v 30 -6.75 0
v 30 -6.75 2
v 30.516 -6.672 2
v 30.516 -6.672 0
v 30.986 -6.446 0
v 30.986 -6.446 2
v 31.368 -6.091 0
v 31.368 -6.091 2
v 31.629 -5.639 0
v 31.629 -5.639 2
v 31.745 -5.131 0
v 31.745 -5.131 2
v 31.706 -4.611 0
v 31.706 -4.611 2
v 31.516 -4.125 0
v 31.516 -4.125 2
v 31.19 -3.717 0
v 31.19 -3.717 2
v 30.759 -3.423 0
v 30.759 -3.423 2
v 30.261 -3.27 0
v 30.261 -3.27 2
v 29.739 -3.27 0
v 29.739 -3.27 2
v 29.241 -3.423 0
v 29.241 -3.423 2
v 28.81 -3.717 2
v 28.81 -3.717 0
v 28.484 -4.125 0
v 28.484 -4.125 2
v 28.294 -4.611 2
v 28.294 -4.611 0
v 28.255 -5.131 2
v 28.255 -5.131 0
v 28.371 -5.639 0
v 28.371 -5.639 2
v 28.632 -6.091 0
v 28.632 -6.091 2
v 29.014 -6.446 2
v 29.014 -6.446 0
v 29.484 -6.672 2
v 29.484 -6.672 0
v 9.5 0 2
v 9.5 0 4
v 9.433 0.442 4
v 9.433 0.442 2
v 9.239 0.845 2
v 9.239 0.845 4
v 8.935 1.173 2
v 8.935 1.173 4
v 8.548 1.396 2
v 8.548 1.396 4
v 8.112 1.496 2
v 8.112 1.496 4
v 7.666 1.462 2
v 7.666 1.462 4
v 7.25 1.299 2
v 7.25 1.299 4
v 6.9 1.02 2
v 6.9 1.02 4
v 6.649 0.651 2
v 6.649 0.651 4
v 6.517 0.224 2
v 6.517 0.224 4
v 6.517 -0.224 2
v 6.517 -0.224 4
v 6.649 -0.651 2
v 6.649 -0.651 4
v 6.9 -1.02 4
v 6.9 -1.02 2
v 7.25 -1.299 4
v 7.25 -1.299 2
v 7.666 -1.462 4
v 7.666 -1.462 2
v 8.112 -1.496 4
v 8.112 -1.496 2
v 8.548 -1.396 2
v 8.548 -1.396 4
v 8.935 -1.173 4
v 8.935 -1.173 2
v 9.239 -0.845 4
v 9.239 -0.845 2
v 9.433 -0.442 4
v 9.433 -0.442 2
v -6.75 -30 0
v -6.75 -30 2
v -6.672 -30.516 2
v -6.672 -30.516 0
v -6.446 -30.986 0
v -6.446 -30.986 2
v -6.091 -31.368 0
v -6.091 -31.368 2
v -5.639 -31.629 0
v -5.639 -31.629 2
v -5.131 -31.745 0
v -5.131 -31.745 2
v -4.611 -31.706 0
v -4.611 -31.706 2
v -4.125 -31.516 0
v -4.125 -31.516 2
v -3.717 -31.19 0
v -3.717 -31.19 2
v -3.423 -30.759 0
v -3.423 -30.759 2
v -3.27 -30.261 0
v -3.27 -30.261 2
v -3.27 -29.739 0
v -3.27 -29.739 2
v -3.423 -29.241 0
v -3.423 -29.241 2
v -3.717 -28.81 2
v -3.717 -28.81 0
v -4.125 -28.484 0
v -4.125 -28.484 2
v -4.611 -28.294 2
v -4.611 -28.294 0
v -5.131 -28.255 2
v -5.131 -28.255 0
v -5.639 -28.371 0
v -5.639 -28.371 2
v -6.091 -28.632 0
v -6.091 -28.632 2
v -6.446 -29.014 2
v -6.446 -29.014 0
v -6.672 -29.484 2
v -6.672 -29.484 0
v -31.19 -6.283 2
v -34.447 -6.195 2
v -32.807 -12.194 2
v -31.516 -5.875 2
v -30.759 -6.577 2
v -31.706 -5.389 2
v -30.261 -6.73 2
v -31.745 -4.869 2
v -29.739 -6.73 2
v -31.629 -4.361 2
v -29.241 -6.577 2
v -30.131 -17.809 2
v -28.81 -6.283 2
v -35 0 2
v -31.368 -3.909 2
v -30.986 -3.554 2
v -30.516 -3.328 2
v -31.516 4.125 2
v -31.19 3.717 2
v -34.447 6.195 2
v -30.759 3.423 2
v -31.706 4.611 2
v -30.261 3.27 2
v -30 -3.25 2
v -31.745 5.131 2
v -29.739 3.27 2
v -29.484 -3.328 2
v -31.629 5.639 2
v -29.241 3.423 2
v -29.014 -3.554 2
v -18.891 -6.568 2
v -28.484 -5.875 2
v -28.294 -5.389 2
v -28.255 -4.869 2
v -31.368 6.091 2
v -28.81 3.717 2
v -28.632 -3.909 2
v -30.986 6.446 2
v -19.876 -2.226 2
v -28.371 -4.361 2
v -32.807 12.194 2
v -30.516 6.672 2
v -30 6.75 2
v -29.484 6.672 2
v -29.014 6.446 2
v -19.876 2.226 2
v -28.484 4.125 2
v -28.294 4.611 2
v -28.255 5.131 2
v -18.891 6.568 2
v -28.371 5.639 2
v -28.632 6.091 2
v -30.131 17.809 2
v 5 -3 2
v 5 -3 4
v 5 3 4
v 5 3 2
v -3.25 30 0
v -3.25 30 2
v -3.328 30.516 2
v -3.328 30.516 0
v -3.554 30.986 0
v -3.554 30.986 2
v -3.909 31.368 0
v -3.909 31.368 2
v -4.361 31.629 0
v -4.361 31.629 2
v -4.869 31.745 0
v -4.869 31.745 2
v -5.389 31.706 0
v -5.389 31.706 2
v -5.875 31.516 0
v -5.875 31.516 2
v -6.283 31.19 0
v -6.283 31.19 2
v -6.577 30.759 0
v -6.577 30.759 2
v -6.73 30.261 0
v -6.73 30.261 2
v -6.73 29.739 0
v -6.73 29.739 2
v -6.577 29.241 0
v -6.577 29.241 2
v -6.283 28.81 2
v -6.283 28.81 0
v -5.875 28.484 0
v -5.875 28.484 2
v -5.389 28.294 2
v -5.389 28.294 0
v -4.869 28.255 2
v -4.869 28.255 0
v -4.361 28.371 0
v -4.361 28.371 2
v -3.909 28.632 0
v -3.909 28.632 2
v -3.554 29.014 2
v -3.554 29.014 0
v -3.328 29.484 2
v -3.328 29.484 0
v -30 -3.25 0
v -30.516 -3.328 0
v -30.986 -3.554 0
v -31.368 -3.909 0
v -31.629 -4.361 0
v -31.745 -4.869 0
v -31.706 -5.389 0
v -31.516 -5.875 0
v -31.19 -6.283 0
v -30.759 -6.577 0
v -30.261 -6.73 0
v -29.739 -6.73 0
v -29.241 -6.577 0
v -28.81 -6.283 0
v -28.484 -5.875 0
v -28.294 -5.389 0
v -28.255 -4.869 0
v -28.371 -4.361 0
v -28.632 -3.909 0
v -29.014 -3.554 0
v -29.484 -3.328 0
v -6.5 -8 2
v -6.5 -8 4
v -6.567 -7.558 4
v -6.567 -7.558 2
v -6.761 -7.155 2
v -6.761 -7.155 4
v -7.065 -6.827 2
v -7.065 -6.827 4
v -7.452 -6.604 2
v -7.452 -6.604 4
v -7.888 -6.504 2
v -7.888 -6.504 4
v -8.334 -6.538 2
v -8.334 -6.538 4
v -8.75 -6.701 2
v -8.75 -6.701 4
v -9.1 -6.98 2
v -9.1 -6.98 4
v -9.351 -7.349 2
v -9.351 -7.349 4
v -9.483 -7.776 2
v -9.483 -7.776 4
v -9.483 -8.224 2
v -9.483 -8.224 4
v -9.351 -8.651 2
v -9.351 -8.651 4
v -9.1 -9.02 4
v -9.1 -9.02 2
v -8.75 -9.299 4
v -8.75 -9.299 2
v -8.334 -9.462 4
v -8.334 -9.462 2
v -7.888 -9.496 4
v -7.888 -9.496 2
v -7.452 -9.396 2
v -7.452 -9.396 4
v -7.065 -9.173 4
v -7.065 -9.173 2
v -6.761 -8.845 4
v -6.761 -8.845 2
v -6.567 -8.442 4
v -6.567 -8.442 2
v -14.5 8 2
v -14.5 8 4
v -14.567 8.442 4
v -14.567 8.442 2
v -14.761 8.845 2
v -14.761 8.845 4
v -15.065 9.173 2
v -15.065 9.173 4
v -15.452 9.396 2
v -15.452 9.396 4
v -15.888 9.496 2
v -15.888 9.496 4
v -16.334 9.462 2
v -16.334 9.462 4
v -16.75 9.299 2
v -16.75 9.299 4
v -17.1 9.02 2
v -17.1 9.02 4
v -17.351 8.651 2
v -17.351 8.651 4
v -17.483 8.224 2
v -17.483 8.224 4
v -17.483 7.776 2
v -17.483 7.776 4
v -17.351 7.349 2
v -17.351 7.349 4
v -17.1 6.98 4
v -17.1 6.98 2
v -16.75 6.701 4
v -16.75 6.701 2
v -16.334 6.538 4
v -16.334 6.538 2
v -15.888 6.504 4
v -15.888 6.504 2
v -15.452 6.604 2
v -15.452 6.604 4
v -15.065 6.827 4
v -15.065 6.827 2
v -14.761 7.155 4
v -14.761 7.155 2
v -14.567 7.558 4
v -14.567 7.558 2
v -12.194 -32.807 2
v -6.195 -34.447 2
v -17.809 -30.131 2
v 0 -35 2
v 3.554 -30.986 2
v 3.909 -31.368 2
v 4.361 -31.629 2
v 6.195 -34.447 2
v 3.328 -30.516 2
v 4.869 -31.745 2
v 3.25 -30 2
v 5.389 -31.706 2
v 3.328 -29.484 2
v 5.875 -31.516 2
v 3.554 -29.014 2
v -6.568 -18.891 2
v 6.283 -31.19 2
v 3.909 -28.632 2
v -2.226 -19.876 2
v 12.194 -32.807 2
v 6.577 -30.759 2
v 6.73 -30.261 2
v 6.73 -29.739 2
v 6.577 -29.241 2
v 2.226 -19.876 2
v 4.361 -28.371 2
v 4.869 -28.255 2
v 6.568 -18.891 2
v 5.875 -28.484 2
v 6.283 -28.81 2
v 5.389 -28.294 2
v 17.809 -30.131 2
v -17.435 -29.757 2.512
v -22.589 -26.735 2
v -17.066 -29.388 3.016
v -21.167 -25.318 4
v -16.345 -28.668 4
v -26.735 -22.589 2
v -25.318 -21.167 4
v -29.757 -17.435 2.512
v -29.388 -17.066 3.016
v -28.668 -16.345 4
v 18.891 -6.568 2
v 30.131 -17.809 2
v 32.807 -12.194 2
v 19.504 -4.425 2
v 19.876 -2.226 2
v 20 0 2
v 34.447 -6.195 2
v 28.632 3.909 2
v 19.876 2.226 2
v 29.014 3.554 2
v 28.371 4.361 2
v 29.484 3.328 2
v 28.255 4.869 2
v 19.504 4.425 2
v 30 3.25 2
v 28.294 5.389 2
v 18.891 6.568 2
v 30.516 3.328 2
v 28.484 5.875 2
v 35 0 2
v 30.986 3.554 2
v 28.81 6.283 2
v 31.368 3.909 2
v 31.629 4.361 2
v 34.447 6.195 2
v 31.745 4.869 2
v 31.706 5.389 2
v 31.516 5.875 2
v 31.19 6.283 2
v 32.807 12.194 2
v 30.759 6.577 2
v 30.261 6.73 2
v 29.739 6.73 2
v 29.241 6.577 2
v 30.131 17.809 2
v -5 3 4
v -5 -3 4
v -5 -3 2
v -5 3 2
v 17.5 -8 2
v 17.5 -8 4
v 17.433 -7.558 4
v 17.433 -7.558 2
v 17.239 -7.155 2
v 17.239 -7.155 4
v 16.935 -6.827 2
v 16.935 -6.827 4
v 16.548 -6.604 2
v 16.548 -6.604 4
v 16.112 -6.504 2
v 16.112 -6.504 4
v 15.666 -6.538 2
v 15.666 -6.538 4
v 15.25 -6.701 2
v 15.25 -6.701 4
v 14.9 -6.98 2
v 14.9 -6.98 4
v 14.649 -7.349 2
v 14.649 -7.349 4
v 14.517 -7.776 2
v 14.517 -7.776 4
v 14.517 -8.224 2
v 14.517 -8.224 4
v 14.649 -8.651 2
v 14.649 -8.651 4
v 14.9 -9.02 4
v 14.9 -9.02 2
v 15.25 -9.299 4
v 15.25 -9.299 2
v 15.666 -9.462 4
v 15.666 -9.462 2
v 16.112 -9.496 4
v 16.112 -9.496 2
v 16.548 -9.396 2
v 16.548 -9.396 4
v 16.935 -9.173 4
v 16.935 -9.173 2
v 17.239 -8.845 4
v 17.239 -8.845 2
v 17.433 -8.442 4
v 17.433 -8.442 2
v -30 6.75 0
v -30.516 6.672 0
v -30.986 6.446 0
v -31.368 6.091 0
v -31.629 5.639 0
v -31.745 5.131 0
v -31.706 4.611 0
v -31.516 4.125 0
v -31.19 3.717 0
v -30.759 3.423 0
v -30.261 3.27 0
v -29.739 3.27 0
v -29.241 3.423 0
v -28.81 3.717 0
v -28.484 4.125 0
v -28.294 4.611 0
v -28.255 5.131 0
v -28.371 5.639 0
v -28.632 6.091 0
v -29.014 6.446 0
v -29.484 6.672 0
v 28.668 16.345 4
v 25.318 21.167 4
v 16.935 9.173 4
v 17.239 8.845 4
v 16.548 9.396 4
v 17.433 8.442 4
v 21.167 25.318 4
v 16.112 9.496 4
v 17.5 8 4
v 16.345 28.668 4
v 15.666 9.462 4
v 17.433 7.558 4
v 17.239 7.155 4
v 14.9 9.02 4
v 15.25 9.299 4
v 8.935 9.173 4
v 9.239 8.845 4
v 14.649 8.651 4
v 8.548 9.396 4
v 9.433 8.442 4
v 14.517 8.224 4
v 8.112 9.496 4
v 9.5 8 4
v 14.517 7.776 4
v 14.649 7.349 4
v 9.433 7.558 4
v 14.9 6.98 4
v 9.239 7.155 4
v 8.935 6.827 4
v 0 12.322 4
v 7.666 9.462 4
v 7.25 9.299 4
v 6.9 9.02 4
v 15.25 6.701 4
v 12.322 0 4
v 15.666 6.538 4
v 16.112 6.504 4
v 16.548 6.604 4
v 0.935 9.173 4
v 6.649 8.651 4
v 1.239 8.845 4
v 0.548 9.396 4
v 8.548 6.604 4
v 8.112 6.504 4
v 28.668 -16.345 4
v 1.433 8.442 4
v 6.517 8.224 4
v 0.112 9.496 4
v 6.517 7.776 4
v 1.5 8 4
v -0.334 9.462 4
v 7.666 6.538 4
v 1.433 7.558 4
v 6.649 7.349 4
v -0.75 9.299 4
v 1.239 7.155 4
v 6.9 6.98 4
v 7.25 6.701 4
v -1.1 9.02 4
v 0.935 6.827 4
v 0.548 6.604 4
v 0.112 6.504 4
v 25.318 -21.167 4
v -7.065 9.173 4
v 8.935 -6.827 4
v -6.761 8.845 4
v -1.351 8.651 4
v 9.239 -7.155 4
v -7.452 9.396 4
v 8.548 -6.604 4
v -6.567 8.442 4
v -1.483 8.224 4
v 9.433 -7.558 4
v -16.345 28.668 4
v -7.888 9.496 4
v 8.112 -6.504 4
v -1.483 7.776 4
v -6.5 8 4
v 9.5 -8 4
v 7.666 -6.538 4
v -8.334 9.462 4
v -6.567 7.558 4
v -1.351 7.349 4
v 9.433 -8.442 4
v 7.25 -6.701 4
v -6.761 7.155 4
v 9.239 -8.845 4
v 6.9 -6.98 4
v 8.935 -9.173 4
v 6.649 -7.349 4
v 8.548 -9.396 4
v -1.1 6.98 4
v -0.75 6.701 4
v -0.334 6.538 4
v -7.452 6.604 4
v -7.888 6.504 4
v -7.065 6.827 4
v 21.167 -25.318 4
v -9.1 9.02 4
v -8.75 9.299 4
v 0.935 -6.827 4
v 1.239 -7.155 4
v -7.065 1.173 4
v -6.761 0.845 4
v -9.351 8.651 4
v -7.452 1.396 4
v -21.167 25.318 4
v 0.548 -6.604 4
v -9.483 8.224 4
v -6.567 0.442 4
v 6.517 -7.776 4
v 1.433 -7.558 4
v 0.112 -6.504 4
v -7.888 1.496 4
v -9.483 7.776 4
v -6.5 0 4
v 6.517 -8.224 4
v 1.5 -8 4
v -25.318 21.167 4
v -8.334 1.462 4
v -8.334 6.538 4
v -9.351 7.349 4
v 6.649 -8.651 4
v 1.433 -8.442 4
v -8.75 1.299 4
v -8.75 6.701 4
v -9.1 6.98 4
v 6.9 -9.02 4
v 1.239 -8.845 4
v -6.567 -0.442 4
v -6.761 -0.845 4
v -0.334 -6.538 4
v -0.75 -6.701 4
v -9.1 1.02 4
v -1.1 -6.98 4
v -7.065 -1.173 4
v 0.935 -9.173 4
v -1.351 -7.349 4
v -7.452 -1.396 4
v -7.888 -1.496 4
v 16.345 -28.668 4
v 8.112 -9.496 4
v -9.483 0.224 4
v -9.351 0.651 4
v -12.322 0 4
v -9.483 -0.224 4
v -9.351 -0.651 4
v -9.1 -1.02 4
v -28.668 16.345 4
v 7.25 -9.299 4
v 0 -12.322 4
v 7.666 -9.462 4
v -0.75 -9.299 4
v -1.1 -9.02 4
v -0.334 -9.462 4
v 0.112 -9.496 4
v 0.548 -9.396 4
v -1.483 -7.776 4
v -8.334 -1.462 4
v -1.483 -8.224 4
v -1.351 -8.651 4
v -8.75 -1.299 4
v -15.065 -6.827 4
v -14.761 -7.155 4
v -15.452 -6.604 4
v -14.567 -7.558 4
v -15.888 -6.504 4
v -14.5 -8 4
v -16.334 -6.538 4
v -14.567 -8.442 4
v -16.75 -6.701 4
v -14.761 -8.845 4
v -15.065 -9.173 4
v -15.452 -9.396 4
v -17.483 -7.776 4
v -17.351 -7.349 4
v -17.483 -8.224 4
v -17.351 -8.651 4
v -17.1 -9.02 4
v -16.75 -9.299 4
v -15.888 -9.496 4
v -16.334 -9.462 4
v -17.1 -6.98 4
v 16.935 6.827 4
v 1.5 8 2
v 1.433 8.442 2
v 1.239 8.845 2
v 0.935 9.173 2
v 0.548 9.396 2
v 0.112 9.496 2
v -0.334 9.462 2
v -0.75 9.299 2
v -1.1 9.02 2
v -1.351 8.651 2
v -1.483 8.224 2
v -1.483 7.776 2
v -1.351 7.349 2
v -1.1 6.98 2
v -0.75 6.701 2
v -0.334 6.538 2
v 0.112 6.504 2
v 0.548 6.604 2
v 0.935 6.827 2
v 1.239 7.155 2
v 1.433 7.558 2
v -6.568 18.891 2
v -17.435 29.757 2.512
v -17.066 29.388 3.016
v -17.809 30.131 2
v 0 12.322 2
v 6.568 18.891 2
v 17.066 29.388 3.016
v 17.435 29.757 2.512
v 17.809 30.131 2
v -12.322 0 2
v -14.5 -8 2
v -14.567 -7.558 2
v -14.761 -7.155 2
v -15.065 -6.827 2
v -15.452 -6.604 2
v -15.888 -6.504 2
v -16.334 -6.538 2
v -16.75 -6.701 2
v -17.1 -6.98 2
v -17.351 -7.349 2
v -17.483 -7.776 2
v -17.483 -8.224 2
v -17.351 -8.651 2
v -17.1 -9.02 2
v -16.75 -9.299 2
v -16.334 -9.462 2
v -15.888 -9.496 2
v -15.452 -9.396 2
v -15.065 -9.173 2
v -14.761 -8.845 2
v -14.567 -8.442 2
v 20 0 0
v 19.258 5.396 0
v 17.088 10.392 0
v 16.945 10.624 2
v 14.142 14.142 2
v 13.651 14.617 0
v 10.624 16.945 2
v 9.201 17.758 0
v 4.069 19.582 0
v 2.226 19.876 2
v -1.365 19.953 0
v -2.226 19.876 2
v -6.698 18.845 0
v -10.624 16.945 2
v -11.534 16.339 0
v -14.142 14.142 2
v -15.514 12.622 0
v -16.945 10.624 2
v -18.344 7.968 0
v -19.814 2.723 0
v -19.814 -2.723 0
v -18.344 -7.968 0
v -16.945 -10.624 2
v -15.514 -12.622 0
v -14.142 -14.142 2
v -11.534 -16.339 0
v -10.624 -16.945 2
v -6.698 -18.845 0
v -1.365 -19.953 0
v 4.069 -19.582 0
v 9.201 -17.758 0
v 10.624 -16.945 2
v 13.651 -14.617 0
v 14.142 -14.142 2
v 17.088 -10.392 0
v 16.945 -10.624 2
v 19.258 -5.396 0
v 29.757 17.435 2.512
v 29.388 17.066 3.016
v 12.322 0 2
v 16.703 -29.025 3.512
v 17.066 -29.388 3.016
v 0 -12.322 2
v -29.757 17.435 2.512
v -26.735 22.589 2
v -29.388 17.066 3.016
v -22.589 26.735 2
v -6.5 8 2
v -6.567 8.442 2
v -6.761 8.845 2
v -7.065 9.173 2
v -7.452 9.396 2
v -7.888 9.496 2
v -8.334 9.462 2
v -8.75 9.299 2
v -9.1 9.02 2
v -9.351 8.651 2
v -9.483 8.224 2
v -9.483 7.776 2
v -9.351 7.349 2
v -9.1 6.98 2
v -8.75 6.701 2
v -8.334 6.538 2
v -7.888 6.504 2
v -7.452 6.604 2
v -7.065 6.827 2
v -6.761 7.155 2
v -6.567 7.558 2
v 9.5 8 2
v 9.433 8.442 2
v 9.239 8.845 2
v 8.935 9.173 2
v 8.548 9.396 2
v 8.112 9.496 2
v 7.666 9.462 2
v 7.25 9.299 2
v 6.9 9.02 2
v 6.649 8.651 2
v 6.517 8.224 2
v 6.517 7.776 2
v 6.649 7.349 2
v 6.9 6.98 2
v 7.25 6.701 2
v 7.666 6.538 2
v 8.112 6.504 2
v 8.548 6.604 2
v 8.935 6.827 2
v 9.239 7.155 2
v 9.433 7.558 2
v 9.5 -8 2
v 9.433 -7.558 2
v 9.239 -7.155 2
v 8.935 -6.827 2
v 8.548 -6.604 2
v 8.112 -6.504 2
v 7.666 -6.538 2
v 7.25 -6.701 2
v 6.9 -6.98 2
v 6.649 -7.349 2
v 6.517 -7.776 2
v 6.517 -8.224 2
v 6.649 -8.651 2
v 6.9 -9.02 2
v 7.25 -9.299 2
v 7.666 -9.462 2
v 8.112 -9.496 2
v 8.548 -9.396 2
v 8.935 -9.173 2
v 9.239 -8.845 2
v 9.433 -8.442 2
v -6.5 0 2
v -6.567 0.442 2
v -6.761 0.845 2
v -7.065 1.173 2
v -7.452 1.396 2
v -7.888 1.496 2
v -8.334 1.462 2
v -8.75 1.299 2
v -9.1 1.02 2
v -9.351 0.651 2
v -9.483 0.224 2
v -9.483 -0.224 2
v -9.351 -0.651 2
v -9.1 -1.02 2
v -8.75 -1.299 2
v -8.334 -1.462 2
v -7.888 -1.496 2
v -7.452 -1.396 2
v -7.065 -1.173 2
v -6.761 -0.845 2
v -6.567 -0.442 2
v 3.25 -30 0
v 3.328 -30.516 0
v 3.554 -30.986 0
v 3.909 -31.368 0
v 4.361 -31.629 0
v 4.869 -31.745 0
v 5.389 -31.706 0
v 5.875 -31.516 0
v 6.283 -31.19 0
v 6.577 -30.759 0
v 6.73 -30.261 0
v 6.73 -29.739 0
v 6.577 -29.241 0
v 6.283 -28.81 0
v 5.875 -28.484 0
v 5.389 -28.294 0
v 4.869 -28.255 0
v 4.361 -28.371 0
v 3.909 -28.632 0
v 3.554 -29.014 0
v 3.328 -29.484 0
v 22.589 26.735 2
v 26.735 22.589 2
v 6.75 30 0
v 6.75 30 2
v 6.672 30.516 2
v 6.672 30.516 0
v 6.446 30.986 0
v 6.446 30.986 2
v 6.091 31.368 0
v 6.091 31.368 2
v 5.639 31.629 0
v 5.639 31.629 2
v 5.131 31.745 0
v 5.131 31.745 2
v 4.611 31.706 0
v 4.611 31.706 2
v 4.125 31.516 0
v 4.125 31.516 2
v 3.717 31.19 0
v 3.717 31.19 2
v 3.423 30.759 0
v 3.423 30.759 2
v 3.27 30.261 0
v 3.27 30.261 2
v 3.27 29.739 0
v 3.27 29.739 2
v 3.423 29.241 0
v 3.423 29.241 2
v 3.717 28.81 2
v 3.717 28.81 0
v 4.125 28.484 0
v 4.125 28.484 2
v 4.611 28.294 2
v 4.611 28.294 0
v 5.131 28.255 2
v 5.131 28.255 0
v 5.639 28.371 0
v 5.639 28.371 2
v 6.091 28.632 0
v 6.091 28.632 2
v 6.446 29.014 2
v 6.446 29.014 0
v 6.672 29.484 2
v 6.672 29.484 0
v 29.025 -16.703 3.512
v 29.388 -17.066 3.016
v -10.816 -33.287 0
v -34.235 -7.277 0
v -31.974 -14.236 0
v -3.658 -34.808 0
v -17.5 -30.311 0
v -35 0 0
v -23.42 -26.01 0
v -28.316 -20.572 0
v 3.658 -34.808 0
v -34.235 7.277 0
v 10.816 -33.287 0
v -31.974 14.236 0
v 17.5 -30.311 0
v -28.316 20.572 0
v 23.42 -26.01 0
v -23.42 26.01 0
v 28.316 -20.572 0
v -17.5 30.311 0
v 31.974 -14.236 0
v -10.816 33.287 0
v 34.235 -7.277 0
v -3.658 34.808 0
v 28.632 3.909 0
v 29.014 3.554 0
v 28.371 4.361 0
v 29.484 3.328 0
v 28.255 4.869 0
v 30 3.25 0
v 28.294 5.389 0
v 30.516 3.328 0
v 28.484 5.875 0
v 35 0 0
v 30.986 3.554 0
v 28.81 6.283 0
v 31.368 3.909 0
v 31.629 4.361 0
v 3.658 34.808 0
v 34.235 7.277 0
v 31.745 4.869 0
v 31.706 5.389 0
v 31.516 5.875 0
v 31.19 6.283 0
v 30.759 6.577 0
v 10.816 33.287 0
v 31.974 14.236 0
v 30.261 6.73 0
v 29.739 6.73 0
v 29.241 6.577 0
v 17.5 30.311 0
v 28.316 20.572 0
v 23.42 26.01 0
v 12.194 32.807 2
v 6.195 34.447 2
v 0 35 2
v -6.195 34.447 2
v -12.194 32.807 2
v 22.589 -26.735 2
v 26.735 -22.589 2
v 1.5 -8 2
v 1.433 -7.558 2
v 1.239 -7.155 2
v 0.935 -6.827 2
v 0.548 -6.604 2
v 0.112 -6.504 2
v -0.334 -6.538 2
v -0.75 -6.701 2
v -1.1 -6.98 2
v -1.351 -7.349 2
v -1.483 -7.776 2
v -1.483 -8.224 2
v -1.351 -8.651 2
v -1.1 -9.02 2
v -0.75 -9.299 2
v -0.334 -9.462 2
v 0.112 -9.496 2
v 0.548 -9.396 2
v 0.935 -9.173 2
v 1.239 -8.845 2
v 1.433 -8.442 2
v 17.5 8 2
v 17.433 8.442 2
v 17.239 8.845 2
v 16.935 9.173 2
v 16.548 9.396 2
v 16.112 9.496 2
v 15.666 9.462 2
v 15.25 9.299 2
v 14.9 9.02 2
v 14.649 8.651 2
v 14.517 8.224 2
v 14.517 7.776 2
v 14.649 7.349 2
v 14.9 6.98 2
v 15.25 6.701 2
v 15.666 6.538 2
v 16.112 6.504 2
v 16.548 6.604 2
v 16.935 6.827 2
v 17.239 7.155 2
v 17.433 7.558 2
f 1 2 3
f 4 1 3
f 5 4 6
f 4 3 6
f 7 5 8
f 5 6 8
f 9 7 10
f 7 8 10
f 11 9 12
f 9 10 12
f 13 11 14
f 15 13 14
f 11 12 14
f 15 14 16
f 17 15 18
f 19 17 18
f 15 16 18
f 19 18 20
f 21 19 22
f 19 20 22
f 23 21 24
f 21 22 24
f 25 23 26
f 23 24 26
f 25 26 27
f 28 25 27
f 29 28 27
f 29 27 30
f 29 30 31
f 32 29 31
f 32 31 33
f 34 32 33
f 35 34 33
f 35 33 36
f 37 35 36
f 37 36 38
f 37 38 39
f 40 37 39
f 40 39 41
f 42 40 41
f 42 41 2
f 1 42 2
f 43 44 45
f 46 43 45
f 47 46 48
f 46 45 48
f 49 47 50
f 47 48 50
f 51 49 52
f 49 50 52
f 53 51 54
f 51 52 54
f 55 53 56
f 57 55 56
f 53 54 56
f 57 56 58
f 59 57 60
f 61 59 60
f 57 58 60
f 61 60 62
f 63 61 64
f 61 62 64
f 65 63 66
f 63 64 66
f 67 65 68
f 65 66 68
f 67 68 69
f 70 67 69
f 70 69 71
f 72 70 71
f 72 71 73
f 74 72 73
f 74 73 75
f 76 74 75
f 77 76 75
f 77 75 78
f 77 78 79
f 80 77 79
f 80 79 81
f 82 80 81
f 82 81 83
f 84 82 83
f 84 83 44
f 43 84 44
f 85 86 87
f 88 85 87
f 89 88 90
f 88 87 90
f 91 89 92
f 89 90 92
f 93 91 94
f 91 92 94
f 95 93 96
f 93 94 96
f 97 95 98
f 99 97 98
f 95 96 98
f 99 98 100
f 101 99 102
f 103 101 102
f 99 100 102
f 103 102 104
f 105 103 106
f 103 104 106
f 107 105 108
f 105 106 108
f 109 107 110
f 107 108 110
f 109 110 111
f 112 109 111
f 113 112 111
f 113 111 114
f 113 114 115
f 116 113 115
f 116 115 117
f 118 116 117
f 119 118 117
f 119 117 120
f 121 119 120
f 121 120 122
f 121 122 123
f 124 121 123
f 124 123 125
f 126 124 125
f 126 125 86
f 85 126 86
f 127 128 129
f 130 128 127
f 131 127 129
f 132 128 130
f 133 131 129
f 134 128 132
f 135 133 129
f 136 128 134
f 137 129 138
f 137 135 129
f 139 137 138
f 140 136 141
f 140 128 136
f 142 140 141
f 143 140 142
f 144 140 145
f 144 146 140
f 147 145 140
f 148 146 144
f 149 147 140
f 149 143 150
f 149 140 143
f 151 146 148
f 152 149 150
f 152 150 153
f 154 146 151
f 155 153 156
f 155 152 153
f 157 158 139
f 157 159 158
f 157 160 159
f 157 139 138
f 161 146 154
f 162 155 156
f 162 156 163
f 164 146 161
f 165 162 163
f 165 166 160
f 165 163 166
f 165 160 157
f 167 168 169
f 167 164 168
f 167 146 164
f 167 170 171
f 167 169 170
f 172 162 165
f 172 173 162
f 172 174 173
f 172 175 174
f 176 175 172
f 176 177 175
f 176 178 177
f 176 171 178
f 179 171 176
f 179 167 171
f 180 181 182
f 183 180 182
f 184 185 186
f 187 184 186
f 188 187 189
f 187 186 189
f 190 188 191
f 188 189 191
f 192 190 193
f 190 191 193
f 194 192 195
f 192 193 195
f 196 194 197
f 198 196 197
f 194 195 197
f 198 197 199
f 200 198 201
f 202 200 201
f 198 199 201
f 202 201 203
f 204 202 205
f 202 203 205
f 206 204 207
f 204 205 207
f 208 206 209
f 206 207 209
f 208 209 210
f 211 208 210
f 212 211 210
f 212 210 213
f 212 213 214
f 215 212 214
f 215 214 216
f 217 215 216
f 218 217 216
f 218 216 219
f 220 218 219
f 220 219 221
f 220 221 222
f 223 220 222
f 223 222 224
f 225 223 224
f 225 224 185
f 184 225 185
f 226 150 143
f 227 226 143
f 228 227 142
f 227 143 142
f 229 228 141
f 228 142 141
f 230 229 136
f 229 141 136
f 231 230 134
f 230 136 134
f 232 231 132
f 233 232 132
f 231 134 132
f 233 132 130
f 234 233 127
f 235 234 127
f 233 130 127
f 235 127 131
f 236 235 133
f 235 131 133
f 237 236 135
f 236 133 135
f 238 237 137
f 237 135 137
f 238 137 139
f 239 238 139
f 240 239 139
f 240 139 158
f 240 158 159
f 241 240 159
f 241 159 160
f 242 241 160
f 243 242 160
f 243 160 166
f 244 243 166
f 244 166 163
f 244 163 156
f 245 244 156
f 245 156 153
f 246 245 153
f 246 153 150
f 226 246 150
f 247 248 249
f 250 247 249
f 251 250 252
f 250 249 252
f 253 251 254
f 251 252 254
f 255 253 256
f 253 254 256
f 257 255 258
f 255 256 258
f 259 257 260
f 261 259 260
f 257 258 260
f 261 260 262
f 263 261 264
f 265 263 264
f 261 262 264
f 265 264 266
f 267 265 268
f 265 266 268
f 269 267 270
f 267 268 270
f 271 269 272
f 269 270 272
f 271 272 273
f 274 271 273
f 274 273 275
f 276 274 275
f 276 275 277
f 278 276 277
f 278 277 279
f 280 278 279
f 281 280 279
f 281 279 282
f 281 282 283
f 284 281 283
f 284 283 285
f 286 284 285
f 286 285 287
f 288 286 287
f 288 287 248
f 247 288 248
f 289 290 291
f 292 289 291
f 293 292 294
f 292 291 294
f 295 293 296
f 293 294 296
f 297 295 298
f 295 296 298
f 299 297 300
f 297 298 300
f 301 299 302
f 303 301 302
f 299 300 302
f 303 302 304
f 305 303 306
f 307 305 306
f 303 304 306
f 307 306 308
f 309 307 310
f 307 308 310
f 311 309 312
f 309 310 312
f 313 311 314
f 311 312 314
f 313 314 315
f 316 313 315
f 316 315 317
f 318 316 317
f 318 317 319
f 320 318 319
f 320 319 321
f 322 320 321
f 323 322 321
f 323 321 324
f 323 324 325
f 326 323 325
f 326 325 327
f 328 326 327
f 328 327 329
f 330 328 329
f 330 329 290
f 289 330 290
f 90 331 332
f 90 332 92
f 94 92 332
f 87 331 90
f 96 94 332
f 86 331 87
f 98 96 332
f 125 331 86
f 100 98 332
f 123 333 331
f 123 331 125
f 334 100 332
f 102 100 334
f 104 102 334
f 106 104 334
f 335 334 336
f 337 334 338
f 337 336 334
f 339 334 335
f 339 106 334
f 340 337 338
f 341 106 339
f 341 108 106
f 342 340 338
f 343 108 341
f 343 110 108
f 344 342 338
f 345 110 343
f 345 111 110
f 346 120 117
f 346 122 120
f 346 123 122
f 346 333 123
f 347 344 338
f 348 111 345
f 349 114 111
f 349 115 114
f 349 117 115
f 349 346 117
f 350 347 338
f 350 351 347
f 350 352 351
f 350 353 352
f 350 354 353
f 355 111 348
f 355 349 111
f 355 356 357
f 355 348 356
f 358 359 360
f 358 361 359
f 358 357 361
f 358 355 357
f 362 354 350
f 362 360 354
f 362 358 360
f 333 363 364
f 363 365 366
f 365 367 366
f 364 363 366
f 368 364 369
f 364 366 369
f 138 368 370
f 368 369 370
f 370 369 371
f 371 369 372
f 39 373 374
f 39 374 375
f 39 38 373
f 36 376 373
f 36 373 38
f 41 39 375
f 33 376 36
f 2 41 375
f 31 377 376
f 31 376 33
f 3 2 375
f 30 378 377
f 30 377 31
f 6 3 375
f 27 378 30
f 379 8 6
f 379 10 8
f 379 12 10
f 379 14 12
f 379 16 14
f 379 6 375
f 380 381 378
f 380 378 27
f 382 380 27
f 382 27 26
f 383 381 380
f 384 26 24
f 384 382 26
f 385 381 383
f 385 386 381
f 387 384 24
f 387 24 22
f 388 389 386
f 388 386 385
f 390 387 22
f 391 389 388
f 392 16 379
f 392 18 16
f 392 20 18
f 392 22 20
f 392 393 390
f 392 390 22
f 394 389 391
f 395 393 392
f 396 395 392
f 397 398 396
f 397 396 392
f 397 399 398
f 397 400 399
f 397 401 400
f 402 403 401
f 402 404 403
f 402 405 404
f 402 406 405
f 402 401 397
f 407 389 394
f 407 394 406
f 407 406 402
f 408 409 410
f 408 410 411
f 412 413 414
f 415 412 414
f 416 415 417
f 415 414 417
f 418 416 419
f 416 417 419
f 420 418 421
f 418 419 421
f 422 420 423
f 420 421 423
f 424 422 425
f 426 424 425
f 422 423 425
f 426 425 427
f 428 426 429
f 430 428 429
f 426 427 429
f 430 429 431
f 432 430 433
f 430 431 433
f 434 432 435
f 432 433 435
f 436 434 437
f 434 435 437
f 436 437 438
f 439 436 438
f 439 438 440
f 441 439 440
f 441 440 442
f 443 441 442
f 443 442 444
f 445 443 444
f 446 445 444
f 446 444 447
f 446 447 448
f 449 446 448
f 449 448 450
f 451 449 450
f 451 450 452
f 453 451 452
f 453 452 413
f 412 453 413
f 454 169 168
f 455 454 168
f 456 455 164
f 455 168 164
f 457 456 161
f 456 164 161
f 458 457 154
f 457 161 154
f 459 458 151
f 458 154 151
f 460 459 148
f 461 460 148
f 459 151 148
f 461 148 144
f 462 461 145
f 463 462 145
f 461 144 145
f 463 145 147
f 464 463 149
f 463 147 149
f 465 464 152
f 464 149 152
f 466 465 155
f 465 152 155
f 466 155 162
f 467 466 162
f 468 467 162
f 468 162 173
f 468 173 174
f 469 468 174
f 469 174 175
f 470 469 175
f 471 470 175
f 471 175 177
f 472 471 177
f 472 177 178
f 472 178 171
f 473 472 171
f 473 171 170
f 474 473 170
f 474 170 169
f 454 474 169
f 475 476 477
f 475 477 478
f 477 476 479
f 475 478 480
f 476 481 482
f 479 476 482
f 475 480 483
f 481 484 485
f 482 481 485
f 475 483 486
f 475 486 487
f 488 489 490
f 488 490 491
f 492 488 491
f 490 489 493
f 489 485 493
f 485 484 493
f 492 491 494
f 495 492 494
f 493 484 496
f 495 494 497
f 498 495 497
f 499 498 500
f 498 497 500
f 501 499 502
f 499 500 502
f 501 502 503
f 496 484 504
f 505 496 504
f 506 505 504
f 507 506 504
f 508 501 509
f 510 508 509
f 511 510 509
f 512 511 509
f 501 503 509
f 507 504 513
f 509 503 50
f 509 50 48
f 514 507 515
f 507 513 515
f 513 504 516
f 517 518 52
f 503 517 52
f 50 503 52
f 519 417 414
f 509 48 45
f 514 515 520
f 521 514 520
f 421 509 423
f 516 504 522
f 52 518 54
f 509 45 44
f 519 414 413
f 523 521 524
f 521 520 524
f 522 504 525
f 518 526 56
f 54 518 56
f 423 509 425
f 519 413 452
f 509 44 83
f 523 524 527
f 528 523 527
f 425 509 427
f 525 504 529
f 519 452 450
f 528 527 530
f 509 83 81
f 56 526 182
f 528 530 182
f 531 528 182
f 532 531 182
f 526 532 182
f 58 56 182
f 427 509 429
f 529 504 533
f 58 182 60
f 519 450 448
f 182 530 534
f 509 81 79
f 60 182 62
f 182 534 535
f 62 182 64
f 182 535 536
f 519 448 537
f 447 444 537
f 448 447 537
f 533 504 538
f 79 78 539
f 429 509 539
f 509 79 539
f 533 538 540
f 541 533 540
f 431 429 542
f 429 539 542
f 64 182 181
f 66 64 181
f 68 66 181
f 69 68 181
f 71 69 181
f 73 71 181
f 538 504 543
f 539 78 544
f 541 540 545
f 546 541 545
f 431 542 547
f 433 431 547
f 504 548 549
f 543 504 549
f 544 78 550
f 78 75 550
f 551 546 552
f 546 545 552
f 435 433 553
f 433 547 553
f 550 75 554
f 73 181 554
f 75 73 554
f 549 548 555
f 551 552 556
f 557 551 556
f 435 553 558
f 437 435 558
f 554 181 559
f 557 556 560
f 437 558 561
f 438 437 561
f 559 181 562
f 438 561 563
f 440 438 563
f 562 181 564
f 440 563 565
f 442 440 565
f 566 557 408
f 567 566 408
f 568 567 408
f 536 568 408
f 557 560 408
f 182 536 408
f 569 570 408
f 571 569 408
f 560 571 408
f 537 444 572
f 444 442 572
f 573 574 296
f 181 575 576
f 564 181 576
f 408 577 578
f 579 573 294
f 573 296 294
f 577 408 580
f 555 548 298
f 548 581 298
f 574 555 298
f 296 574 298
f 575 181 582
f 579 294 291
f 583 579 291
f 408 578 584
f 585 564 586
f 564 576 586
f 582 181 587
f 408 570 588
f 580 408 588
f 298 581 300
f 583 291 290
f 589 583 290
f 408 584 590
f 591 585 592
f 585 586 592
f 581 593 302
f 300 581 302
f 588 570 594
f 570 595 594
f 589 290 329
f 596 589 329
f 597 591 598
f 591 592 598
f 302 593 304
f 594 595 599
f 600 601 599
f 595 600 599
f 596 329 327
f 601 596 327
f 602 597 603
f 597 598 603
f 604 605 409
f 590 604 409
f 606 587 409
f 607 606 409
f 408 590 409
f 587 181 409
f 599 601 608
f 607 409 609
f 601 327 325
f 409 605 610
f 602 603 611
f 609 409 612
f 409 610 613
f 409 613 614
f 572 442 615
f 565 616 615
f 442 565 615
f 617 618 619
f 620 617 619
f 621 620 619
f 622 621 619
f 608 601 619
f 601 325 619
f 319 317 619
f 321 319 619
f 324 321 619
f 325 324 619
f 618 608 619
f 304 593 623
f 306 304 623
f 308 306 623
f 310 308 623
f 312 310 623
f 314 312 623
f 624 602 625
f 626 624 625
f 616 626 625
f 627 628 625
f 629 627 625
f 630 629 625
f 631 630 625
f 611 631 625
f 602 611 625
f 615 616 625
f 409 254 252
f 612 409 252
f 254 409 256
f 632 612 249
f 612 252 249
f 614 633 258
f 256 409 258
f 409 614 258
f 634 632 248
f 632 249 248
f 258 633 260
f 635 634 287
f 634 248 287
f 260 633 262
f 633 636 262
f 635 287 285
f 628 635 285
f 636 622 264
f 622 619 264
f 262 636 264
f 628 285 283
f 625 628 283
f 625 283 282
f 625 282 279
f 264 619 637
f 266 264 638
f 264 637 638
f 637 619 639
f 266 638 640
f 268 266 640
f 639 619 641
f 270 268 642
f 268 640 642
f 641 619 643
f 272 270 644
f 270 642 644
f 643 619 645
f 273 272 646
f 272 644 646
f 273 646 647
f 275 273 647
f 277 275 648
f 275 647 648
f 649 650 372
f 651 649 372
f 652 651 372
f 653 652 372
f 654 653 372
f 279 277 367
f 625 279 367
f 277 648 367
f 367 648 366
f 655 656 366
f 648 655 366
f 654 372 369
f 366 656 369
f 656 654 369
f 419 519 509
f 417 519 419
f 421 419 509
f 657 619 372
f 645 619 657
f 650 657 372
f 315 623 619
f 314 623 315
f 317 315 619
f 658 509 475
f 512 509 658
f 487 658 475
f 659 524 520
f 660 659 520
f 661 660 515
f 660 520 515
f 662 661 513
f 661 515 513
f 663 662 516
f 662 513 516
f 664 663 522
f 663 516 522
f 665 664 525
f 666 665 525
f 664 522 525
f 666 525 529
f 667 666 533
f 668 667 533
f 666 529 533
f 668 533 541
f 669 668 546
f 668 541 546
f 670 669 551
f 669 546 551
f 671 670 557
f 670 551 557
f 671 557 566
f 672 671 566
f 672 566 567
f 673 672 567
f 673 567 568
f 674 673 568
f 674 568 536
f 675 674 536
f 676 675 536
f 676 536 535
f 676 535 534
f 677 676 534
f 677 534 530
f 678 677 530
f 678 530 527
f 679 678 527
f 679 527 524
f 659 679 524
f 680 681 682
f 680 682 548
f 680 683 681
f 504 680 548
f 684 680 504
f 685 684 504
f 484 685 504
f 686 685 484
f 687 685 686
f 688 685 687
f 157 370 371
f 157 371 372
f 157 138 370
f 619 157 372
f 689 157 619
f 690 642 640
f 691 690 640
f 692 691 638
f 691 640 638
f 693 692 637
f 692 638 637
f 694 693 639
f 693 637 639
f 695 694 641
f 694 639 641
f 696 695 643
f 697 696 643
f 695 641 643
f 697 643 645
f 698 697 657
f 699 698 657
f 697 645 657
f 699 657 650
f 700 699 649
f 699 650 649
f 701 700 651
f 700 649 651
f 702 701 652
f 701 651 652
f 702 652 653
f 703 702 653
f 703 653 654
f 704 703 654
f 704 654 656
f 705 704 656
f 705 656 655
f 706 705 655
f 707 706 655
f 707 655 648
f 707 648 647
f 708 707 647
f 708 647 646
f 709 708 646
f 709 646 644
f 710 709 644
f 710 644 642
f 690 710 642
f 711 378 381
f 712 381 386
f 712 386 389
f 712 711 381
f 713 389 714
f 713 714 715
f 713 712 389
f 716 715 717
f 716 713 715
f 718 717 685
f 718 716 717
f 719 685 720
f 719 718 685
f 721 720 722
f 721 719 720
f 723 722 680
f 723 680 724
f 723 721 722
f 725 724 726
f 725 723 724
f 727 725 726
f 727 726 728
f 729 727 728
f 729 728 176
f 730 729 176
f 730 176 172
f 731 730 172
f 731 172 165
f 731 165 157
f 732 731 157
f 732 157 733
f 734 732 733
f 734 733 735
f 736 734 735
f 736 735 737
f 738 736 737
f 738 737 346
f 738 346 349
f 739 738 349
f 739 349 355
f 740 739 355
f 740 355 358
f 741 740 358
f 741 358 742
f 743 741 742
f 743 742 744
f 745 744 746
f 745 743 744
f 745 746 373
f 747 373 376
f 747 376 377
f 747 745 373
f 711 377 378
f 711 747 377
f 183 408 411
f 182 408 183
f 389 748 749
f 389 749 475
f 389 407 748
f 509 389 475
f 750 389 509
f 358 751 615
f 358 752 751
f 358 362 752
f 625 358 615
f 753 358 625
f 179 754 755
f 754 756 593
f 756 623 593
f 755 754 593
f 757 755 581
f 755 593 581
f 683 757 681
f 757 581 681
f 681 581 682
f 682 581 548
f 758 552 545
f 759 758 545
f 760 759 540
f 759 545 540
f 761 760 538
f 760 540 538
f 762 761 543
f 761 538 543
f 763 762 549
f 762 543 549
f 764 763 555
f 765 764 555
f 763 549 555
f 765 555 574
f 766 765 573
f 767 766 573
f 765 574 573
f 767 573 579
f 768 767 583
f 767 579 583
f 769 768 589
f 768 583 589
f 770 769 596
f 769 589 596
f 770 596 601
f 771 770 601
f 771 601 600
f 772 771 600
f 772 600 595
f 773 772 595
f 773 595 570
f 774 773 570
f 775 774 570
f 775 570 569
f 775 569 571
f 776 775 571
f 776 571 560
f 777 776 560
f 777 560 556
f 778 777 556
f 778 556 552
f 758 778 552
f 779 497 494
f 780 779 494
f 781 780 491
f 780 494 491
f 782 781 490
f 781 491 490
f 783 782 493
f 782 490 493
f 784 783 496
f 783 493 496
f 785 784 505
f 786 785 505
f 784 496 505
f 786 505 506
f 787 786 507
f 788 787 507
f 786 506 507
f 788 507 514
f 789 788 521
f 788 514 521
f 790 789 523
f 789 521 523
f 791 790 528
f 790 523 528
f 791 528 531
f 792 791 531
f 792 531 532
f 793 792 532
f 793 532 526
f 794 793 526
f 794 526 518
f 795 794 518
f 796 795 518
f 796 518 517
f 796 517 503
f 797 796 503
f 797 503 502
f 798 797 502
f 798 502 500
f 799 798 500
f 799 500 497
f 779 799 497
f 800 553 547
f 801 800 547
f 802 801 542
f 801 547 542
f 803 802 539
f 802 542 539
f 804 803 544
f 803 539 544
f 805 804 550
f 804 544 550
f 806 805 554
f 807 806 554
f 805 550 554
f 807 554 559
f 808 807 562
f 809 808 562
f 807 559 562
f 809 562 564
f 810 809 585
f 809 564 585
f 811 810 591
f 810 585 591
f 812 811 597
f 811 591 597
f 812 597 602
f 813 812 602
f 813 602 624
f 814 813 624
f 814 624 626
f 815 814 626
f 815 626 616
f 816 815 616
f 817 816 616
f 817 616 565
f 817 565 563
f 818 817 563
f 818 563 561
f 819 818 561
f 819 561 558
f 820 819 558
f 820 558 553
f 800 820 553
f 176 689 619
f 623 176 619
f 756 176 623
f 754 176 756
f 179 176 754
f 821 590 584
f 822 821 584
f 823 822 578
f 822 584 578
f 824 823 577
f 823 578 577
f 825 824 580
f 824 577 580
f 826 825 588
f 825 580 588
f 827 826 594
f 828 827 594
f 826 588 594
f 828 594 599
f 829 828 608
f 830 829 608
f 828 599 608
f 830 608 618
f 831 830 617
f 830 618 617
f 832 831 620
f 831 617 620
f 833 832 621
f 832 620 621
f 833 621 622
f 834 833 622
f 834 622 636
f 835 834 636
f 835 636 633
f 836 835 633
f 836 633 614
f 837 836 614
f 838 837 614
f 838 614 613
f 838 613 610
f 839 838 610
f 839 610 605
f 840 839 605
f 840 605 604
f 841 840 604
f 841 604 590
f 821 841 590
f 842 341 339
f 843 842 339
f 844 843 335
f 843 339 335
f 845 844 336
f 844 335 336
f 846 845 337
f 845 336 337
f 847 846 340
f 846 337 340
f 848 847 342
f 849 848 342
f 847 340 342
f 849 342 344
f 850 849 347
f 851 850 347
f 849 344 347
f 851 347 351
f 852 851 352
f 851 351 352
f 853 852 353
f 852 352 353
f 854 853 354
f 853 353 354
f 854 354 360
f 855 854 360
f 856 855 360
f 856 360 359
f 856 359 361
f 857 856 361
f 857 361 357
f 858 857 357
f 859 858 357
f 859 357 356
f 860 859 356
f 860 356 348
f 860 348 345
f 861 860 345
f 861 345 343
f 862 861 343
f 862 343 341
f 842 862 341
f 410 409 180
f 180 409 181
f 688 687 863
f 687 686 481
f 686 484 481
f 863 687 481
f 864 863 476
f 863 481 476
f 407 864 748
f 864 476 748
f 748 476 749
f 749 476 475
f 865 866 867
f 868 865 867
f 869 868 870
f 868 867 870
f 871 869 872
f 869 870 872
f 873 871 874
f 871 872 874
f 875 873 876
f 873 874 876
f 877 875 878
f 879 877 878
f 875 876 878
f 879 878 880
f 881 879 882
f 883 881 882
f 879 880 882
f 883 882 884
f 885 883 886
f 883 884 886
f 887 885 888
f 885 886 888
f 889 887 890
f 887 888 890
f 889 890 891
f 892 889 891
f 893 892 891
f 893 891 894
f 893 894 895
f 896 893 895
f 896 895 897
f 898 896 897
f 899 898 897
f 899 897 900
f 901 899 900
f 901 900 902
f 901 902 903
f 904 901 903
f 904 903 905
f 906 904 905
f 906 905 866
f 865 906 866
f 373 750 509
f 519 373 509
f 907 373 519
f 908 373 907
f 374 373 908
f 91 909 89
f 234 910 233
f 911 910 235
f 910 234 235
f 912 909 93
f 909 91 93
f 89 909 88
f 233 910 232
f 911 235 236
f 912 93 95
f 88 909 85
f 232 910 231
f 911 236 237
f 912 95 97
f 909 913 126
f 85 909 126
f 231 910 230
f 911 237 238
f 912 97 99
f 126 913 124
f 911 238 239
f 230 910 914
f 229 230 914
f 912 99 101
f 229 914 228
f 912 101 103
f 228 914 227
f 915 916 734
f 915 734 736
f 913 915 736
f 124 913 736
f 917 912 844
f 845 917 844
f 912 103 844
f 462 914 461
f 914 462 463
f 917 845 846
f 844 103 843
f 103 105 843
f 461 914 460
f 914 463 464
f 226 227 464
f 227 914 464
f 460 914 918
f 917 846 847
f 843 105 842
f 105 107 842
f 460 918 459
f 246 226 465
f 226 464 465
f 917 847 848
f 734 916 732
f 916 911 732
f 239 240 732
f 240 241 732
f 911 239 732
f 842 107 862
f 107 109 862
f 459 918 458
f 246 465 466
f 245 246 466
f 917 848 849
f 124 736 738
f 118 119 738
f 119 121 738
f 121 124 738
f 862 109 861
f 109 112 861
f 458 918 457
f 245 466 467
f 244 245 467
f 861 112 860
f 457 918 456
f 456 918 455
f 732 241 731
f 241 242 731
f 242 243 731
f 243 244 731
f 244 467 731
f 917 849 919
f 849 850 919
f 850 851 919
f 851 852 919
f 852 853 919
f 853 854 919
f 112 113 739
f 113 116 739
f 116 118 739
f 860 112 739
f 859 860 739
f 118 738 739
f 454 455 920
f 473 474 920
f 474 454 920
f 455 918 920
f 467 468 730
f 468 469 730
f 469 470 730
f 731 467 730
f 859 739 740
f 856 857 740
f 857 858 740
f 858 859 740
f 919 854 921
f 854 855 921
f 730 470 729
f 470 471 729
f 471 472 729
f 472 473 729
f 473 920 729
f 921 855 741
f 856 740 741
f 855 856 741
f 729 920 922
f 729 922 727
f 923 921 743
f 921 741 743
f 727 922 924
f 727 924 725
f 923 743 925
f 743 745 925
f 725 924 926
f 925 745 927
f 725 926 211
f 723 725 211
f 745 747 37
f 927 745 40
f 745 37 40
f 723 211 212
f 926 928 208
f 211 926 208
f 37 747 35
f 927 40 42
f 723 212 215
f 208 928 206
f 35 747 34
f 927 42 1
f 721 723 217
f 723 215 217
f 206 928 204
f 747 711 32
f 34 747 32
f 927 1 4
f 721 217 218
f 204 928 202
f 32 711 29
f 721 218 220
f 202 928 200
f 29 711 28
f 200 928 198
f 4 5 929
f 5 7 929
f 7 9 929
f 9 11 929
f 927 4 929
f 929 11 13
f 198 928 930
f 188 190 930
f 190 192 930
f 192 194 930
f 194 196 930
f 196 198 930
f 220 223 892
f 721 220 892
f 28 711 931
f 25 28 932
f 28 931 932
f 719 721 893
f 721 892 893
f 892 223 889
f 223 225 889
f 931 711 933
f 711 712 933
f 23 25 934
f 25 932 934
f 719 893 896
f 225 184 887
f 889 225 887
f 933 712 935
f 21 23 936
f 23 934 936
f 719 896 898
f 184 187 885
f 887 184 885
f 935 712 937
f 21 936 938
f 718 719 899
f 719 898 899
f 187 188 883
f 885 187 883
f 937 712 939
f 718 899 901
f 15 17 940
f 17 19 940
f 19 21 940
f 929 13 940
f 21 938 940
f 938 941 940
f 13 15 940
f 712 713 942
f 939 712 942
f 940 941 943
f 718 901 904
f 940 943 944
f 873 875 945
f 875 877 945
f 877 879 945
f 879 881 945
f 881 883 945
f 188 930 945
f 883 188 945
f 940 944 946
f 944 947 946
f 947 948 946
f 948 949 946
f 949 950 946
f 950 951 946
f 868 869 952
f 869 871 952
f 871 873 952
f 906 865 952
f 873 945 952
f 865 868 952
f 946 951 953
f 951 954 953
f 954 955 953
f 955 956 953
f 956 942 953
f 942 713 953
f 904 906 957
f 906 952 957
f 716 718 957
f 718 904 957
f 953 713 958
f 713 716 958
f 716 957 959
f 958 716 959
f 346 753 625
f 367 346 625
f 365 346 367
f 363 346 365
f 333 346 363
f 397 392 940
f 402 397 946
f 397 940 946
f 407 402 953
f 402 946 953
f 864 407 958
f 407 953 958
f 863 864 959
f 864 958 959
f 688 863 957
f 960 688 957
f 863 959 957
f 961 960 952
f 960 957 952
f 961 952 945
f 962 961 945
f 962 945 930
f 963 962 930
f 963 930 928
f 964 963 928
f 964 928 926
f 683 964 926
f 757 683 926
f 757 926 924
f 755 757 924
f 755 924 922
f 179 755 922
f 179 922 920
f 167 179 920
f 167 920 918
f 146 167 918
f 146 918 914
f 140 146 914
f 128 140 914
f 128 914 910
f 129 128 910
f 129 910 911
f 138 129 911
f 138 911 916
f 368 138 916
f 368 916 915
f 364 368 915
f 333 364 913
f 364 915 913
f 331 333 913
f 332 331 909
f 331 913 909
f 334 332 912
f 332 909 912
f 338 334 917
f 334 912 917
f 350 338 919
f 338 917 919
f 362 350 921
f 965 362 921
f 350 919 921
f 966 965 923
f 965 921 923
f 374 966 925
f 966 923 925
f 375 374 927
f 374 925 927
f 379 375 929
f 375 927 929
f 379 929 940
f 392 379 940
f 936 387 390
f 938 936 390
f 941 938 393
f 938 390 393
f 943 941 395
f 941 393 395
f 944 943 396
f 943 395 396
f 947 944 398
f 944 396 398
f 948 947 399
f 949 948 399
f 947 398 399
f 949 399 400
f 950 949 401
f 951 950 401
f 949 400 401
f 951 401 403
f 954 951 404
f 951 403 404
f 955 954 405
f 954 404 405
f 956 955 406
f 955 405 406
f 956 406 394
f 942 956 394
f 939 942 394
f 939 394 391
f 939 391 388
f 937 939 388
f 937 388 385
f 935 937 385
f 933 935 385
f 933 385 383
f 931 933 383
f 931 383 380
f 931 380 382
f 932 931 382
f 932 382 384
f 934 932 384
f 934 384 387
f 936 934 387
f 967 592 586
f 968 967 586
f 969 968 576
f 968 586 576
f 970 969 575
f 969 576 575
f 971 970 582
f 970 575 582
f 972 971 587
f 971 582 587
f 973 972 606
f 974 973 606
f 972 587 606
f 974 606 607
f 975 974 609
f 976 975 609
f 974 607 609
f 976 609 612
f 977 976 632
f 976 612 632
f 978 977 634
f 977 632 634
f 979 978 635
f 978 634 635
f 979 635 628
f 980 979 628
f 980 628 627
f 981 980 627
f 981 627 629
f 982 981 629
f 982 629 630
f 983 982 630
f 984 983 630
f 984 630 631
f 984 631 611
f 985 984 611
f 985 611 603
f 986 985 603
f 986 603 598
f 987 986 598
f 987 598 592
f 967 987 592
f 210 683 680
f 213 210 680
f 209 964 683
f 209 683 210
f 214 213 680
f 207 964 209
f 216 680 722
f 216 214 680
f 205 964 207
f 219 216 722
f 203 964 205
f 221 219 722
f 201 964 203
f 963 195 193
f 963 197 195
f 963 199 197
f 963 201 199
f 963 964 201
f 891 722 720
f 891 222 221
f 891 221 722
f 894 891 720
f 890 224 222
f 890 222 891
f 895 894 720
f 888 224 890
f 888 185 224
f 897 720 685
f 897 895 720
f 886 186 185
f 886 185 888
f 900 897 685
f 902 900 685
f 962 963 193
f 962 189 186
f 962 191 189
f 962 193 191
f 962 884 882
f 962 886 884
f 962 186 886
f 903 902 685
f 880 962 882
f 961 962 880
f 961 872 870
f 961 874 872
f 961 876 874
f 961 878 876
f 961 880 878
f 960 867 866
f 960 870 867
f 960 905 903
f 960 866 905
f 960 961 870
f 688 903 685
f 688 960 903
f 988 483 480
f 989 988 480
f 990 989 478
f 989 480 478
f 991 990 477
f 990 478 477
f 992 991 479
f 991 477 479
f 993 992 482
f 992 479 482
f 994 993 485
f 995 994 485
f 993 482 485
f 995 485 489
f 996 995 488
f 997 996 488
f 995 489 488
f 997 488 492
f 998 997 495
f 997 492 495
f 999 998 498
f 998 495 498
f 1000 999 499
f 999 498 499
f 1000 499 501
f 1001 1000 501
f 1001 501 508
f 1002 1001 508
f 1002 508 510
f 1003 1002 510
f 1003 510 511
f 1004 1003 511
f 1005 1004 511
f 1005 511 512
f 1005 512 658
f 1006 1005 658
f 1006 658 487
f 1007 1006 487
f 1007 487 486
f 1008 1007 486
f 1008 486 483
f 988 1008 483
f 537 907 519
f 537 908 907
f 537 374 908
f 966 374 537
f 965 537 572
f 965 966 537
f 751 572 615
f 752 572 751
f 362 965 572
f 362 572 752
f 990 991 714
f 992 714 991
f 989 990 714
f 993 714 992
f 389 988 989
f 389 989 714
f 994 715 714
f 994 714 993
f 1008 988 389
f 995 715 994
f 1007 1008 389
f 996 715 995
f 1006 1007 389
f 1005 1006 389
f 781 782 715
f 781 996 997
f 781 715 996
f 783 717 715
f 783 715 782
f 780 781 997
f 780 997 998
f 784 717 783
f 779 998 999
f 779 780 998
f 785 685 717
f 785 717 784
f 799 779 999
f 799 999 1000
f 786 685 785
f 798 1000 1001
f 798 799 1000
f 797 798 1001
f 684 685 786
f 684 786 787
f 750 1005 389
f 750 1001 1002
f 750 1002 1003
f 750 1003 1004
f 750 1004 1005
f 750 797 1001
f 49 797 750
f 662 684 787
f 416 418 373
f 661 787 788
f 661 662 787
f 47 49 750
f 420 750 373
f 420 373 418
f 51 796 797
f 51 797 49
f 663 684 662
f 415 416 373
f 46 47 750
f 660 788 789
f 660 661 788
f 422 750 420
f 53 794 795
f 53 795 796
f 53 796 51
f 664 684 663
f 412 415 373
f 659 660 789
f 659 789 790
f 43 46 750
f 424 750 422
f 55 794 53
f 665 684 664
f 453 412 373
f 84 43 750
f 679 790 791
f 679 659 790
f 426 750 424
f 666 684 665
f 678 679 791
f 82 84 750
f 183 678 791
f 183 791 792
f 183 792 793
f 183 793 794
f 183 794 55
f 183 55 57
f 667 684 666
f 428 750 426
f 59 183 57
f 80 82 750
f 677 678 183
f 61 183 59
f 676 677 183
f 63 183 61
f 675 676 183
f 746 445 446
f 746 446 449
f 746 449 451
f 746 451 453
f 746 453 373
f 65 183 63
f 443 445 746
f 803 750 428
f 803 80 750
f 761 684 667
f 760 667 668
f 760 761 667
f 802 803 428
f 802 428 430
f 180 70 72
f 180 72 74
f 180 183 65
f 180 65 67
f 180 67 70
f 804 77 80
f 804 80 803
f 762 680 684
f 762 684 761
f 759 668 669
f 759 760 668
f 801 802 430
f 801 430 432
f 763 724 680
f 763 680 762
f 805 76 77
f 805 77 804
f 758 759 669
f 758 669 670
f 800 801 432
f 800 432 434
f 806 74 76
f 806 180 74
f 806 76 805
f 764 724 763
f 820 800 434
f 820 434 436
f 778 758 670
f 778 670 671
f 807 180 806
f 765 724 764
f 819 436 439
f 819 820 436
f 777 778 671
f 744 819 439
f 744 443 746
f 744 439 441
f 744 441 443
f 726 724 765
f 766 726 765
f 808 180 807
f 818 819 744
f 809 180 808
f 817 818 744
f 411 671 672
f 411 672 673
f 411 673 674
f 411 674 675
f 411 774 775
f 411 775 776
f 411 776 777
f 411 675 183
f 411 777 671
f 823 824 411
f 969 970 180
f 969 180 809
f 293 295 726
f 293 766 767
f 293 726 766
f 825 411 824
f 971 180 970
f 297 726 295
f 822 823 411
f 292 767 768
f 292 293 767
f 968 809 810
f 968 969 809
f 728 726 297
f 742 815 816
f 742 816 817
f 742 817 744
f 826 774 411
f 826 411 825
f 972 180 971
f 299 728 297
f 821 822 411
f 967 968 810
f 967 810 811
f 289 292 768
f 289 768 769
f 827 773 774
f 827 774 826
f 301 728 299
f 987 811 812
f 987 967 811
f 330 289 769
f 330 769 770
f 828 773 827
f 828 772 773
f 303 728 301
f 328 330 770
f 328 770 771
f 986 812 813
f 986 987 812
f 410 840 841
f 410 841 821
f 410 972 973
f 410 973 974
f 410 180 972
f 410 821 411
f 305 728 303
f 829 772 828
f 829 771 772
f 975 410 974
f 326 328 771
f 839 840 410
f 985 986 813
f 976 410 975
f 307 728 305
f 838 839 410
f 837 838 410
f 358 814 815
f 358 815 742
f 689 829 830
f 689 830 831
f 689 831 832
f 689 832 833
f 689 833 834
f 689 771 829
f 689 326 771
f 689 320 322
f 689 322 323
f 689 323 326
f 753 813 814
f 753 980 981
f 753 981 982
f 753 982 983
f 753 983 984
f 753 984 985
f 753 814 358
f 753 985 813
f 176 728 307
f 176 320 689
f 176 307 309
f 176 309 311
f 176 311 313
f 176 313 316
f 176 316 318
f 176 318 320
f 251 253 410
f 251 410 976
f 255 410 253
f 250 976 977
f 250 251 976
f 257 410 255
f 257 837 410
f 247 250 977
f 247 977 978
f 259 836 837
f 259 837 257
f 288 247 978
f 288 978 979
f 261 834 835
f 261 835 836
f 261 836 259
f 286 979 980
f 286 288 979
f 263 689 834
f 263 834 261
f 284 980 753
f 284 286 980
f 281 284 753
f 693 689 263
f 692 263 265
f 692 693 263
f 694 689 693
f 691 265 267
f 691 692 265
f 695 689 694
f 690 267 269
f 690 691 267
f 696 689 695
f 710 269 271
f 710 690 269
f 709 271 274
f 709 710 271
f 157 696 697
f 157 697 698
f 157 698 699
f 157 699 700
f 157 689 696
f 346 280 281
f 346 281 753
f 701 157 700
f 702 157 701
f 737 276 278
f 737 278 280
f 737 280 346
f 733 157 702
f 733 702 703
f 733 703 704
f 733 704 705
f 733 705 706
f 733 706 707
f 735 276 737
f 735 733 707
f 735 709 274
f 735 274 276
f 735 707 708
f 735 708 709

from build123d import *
from build123d.topology import SkipClean

# Parameters (mm, degrees)
SKETCH1_R                    = 35
SKETCH1_R_2                  = 20
BOSS_EXTRUDE1_DEPTH          = 2
SKETCH2_R                    = 1.75
CUT_EXTRUDE1_DEPTH           = 50.537864306
CIRPATTERN1_COUNT            = 4
BOSS_EXTRUDE2_DEPTH          = 2
CHAMFER1_SIZE                = 2
CIRPATTERN2_COUNT            = 2
CIRPATTERN2_ANGLE            = 90
CHAMFER1_OF_CIRPATTERN2_SIZE = 2
SKETCH5_R                    = 1.5
SKETCH5_W                    = 10
SKETCH5_H                    = 6
CUT_EXTRUDE2_DEPTH           = 50.658836072


with BuildPart() as part:
    # Sketch1 → Boss-Extrude1 (new body)
    with BuildSketch(Plane.XY):
        Circle(SKETCH1_R)
        Circle(SKETCH1_R_2, mode=Mode.SUBTRACT)
    extrude(amount=BOSS_EXTRUDE1_DEPTH)

    # Sketch2 → Cut-Extrude1 (cut, through all)
    with BuildSketch(Plane.XY.offset(2)):
        with Locations((5, 30)):
            Circle(SKETCH2_R)
        with Locations((-5, 30)):
            Circle(SKETCH2_R)
    cut_extrude1 = extrude(amount=-CUT_EXTRUDE1_DEPTH, mode=Mode.SUBTRACT)

    # CirPattern1: Cut-Extrude1 ×4 about axis
    cirpattern1_axis = Axis((0, 0, 0), (0, 0, 1))
    for i in range(1, CIRPATTERN1_COUNT):
        add(cut_extrude1.rotate(cirpattern1_axis, i * 360 / CIRPATTERN1_COUNT), mode=Mode.SUBTRACT)

    # Sketch3 → Boss-Extrude2 (add)
    with SkipClean():  # the faces are left unmerged after this step: merging them gives an invalid solid
        with BuildSketch(Plane.XY.offset(2)):
            with BuildLine():
                Line((-30.130645656, -17.80854268), (17.80854268, 30.130645656))
                ThreePointArc((17.80854268, 30.130645656), (24.748737342, 24.748737342), (30.130645656, 17.80854268))
                Line((30.130645656, 17.80854268), (-17.80854268, -30.130645656))
                ThreePointArc((-17.80854268, -30.130645656), (-24.748737342, -24.748737342), (-30.130645656, -17.80854268))
            make_face()
        boss_extrude2 = extrude(amount=BOSS_EXTRUDE2_DEPTH)

    # Chamfer1
    chamfer1_edges = [part.edges().sort_by_distance(p)[0] for p in [
        (-24.748737342, -24.748737342, 4),
        (24.748737342, 24.748737342, 4),
    ]]
    chamfer(chamfer1_edges, length=CHAMFER1_SIZE - 0.0001)  # a hair under: the kernel refuses the full size

    # CirPattern2: Boss-Extrude2 ×2 about axis
    with SkipClean():  # the faces are left unmerged after this step: merging them gives an invalid solid
        cirpattern2_axis = Axis((0, 0, 0), (0, 0, 1))
        for i in range(1, CIRPATTERN2_COUNT):
            add(boss_extrude2.rotate(cirpattern2_axis, i * CIRPATTERN2_ANGLE / (CIRPATTERN2_COUNT - 1)))

    # Chamfer1 of CirPattern2
    chamfer1_of_cirpattern2_edges = [part.edges().sort_by_distance(p)[0] for p in [
        (24.748737342, -24.748737342, 4),
        (-24.748737342, 24.748737342, 4),
    ]]
    chamfer(chamfer1_of_cirpattern2_edges, length=CHAMFER1_OF_CIRPATTERN2_SIZE - 0.0001)  # a hair under: the kernel refuses the full size

    # Sketch5 → Cut-Extrude2 (cut, through all)
    with BuildSketch(Plane.XY.offset(4)):
        with Locations((0, 8)):
            Circle(SKETCH5_R)
        with Locations((-8, 8)):
            Circle(SKETCH5_R)
        with Locations((-8, 0)):
            Circle(SKETCH5_R)
        with Locations((-8, -8)):
            Circle(SKETCH5_R)
        with Locations((8, -8)):
            Circle(SKETCH5_R)
        with Locations((8, 0)):
            Circle(SKETCH5_R)
        with Locations((8, 8)):
            Circle(SKETCH5_R)
        with Locations((0, -8)):
            Circle(SKETCH5_R)
        with Locations((-16, 8)):
            Circle(SKETCH5_R)
        with Locations((-16, 0)):
            Circle(SKETCH5_R)
        with Locations((-16, -8)):
            Circle(SKETCH5_R)
        with Locations((16, -8)):
            Circle(SKETCH5_R)
        with Locations((16, 0)):
            Circle(SKETCH5_R)
        with Locations((16, 8)):
            Circle(SKETCH5_R)
        Rectangle(SKETCH5_W, SKETCH5_H)
    extrude(amount=-CUT_EXTRUDE2_DEPTH, mode=Mode.SUBTRACT)


solid = part.part
